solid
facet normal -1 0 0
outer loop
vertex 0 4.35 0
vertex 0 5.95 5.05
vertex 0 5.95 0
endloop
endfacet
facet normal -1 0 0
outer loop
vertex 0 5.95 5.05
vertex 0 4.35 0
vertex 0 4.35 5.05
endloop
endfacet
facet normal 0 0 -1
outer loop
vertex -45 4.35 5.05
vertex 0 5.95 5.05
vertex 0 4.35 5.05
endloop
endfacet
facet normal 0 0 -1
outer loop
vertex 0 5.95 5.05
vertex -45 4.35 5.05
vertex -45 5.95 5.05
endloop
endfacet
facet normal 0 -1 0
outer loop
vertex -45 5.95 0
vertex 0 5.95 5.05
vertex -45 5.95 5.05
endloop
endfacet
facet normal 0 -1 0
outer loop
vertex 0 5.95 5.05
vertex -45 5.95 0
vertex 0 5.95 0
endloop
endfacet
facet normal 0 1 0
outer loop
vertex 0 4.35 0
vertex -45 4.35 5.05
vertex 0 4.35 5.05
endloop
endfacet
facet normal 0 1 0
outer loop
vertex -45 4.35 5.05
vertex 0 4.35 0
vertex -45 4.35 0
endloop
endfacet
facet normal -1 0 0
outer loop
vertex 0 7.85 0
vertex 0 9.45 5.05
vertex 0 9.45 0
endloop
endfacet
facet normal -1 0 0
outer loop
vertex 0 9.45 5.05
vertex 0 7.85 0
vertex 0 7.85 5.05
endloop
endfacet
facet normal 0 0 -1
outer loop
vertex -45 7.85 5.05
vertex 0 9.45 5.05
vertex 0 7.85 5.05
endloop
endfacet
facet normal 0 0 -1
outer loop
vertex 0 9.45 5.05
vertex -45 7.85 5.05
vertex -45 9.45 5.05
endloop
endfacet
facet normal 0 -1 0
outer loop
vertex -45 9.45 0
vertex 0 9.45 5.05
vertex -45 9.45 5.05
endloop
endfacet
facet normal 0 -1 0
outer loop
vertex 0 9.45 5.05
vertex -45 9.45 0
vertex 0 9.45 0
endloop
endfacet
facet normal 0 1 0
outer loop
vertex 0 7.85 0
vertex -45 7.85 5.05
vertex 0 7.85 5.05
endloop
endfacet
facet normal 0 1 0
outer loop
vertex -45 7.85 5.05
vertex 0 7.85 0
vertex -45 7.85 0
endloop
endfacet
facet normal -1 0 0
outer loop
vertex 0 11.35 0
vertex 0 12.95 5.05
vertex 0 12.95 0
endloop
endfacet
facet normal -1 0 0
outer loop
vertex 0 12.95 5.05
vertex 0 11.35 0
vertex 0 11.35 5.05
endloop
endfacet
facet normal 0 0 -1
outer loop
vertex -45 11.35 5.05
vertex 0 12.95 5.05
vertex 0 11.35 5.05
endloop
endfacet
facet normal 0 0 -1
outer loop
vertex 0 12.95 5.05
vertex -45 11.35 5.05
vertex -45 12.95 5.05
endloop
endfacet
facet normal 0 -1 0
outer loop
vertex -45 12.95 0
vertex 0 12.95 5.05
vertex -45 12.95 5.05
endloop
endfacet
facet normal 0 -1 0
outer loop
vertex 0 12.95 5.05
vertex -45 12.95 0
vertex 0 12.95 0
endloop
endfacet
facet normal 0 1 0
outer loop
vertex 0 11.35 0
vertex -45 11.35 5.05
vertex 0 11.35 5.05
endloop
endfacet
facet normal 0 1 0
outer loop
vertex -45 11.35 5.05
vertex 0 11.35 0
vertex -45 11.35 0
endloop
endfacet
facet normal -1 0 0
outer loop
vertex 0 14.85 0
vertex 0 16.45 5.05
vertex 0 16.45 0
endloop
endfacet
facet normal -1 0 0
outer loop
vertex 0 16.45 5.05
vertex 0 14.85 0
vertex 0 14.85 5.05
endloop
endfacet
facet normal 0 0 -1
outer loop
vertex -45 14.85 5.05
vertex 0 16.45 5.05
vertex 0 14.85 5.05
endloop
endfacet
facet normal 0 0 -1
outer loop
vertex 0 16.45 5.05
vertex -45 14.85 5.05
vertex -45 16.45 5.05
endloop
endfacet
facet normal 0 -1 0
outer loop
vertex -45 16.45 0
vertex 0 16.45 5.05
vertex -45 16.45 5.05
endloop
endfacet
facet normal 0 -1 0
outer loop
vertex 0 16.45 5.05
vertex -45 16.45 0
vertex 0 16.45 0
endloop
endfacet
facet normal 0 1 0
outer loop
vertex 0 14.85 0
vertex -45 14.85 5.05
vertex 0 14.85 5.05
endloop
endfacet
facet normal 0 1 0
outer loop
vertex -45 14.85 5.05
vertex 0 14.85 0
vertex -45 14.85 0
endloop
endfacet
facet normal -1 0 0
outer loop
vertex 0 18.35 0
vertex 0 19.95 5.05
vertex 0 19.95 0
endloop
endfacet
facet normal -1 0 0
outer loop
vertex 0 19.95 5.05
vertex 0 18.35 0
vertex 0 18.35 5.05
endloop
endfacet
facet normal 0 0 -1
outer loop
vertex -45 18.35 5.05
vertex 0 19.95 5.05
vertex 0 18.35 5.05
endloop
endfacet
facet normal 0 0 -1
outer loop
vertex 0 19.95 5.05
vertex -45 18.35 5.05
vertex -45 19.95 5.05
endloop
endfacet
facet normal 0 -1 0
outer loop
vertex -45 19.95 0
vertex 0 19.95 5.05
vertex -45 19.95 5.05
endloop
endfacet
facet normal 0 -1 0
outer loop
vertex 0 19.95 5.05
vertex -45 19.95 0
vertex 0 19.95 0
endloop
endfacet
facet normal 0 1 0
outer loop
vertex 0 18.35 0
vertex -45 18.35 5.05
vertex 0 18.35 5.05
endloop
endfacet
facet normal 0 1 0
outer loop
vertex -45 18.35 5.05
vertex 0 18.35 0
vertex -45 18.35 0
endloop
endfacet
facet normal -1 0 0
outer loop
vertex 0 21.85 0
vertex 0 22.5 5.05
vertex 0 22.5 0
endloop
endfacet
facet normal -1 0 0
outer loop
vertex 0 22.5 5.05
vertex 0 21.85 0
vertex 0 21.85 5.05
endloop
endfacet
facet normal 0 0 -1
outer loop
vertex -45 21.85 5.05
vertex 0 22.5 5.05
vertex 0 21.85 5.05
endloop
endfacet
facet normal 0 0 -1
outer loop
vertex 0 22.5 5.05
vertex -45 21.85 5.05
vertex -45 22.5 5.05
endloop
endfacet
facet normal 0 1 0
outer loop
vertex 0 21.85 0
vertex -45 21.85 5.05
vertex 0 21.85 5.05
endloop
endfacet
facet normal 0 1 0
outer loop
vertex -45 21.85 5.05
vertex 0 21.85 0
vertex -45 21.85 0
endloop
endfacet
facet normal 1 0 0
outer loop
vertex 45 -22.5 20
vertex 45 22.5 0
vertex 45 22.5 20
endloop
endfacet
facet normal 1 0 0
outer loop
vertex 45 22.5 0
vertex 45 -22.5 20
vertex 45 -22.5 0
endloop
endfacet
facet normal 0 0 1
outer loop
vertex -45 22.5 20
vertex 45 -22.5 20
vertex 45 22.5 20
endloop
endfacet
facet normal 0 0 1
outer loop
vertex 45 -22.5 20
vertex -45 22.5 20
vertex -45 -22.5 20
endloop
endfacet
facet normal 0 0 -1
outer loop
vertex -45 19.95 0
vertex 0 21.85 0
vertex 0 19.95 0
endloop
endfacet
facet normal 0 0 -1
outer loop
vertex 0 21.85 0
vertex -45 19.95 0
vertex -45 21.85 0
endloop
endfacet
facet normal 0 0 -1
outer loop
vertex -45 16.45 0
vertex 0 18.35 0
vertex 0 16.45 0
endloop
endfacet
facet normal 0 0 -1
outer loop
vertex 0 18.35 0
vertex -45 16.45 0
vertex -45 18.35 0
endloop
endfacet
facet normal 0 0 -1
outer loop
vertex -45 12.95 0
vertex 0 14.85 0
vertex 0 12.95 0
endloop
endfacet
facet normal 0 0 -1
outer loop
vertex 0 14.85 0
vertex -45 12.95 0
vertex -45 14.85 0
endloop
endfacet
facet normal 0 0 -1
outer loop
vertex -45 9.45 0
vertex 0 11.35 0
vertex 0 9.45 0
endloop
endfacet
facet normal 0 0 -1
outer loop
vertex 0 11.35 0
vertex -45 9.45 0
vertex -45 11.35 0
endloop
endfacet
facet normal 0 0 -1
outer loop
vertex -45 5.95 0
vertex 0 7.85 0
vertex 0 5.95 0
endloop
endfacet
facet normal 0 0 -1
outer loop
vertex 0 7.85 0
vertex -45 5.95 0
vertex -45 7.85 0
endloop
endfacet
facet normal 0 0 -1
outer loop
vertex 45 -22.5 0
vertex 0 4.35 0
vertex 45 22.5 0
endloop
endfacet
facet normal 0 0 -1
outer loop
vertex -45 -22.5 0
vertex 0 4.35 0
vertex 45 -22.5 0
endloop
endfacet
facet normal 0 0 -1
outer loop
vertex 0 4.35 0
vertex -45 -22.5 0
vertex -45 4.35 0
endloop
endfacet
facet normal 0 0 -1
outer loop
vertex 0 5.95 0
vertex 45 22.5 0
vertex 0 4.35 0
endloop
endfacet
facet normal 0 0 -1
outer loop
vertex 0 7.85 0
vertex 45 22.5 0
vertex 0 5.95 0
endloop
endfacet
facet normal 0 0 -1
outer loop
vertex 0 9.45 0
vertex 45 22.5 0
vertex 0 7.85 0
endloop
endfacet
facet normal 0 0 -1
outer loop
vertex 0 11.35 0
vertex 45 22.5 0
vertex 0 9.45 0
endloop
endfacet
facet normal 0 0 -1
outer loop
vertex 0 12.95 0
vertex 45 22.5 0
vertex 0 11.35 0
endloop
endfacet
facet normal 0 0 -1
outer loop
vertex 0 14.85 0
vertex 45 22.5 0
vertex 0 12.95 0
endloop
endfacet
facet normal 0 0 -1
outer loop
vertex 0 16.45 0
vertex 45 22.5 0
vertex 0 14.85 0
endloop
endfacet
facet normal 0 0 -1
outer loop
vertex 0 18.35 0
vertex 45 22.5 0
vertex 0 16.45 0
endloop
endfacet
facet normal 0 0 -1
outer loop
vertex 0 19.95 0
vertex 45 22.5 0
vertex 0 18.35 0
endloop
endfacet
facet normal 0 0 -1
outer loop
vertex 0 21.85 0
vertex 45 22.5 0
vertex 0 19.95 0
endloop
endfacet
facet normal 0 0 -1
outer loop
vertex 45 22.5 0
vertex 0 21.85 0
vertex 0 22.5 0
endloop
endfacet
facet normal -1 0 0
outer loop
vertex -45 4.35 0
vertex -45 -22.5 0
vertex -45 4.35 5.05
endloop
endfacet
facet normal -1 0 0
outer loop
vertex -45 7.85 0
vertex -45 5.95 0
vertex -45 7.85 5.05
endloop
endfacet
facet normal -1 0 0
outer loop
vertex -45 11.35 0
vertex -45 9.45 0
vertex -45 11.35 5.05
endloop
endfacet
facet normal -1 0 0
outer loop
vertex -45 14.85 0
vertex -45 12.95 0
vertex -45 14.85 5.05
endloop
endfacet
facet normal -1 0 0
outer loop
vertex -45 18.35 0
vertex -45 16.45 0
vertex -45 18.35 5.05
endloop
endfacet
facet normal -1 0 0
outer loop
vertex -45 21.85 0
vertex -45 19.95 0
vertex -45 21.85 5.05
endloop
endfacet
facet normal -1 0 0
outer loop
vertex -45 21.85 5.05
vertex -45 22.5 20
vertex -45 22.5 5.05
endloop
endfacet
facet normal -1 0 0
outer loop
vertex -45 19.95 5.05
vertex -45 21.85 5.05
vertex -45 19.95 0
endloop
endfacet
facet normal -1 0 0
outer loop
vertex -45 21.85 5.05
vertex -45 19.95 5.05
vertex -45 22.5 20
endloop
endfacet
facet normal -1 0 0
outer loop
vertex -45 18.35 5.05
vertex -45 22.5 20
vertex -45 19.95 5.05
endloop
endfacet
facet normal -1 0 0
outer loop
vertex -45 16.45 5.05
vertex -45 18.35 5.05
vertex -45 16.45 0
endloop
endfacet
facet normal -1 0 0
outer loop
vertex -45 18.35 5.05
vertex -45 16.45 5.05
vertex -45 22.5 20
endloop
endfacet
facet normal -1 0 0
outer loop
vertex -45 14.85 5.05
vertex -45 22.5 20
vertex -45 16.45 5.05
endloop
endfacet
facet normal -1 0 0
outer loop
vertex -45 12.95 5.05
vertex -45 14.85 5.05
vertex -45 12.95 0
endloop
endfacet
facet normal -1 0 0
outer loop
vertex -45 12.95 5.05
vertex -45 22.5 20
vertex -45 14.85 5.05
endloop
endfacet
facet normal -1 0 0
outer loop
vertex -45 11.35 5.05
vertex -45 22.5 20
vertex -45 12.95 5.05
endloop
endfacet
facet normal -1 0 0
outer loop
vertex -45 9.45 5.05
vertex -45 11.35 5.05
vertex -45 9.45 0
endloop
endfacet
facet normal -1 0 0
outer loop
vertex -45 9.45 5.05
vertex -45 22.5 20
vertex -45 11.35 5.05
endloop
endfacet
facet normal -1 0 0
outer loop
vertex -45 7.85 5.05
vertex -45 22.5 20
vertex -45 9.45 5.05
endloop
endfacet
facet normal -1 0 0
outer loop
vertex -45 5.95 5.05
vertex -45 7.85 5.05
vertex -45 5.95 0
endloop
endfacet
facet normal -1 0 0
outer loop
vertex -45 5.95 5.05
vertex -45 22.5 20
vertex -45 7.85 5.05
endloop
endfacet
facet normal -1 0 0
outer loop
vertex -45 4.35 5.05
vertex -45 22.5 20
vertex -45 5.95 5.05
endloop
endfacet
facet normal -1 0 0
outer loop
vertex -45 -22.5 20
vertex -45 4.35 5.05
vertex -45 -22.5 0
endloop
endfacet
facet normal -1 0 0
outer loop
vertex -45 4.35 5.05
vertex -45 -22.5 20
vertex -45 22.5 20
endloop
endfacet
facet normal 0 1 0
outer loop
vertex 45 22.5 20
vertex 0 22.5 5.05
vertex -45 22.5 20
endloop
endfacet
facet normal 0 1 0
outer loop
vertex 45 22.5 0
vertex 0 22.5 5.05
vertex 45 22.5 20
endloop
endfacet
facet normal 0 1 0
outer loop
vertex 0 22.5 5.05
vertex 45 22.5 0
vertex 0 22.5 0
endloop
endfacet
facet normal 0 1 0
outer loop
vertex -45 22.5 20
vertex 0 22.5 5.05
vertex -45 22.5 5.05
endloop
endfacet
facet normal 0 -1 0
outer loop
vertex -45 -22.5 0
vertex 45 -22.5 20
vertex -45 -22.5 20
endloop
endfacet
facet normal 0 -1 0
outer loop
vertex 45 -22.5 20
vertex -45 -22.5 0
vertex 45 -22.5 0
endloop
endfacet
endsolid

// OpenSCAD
$fn = 64;

// Dimensions
block_length_x = 90;
block_width_y = 45;
block_height_z = 20;

slot_length_x = 77;
slot_width_y = 1.6;
slot_depth_z = 10;

slot_spacing_y = 3.5;

// Derived Dimensions
num_slots = 10;
total_slot_width = (num_slots - 1) * slot_spacing_y;
slot_offset_y = (total_slot_width / 2) + (slot_width_y / 2);

module base_block() {
    cube([block_length_x, block_width_y, block_height_z], center=true);
}

module slot_cutout() {
    // Translate to the edge of the block in Y
    // We cut from the center, so we move half the block width
    translate([0, block_width_y / 2, 0]) {
        // Cut the slot
        translate([-slot_length_x / 2, -slot_width_y / 2, -slot_depth_z]) {
            cube([slot_length_x, slot_width_y, slot_depth_z + 0.1], center=true);
        }
    }
}

module drying_rack() {
    difference() {
        base_block();
        
        // Create 10 slots centered in X and Y
        for (i = [0 : num_slots - 1]) {
            // Calculate Y position for each slot
            // Center of the block is 0. 
            // Slot i is at i * spacing.
            // We need to account for the offset calculated earlier.
            y_pos = (i * slot_spacing_y) - slot_offset_y;
            
            translate([0, y_pos, 0]) {
                slot_cutout();
            }
        }
    }
}

// Translate the entire part up by 10mm so the bottom is at z=0
translate([0, 0, 10])
drying_rack();
